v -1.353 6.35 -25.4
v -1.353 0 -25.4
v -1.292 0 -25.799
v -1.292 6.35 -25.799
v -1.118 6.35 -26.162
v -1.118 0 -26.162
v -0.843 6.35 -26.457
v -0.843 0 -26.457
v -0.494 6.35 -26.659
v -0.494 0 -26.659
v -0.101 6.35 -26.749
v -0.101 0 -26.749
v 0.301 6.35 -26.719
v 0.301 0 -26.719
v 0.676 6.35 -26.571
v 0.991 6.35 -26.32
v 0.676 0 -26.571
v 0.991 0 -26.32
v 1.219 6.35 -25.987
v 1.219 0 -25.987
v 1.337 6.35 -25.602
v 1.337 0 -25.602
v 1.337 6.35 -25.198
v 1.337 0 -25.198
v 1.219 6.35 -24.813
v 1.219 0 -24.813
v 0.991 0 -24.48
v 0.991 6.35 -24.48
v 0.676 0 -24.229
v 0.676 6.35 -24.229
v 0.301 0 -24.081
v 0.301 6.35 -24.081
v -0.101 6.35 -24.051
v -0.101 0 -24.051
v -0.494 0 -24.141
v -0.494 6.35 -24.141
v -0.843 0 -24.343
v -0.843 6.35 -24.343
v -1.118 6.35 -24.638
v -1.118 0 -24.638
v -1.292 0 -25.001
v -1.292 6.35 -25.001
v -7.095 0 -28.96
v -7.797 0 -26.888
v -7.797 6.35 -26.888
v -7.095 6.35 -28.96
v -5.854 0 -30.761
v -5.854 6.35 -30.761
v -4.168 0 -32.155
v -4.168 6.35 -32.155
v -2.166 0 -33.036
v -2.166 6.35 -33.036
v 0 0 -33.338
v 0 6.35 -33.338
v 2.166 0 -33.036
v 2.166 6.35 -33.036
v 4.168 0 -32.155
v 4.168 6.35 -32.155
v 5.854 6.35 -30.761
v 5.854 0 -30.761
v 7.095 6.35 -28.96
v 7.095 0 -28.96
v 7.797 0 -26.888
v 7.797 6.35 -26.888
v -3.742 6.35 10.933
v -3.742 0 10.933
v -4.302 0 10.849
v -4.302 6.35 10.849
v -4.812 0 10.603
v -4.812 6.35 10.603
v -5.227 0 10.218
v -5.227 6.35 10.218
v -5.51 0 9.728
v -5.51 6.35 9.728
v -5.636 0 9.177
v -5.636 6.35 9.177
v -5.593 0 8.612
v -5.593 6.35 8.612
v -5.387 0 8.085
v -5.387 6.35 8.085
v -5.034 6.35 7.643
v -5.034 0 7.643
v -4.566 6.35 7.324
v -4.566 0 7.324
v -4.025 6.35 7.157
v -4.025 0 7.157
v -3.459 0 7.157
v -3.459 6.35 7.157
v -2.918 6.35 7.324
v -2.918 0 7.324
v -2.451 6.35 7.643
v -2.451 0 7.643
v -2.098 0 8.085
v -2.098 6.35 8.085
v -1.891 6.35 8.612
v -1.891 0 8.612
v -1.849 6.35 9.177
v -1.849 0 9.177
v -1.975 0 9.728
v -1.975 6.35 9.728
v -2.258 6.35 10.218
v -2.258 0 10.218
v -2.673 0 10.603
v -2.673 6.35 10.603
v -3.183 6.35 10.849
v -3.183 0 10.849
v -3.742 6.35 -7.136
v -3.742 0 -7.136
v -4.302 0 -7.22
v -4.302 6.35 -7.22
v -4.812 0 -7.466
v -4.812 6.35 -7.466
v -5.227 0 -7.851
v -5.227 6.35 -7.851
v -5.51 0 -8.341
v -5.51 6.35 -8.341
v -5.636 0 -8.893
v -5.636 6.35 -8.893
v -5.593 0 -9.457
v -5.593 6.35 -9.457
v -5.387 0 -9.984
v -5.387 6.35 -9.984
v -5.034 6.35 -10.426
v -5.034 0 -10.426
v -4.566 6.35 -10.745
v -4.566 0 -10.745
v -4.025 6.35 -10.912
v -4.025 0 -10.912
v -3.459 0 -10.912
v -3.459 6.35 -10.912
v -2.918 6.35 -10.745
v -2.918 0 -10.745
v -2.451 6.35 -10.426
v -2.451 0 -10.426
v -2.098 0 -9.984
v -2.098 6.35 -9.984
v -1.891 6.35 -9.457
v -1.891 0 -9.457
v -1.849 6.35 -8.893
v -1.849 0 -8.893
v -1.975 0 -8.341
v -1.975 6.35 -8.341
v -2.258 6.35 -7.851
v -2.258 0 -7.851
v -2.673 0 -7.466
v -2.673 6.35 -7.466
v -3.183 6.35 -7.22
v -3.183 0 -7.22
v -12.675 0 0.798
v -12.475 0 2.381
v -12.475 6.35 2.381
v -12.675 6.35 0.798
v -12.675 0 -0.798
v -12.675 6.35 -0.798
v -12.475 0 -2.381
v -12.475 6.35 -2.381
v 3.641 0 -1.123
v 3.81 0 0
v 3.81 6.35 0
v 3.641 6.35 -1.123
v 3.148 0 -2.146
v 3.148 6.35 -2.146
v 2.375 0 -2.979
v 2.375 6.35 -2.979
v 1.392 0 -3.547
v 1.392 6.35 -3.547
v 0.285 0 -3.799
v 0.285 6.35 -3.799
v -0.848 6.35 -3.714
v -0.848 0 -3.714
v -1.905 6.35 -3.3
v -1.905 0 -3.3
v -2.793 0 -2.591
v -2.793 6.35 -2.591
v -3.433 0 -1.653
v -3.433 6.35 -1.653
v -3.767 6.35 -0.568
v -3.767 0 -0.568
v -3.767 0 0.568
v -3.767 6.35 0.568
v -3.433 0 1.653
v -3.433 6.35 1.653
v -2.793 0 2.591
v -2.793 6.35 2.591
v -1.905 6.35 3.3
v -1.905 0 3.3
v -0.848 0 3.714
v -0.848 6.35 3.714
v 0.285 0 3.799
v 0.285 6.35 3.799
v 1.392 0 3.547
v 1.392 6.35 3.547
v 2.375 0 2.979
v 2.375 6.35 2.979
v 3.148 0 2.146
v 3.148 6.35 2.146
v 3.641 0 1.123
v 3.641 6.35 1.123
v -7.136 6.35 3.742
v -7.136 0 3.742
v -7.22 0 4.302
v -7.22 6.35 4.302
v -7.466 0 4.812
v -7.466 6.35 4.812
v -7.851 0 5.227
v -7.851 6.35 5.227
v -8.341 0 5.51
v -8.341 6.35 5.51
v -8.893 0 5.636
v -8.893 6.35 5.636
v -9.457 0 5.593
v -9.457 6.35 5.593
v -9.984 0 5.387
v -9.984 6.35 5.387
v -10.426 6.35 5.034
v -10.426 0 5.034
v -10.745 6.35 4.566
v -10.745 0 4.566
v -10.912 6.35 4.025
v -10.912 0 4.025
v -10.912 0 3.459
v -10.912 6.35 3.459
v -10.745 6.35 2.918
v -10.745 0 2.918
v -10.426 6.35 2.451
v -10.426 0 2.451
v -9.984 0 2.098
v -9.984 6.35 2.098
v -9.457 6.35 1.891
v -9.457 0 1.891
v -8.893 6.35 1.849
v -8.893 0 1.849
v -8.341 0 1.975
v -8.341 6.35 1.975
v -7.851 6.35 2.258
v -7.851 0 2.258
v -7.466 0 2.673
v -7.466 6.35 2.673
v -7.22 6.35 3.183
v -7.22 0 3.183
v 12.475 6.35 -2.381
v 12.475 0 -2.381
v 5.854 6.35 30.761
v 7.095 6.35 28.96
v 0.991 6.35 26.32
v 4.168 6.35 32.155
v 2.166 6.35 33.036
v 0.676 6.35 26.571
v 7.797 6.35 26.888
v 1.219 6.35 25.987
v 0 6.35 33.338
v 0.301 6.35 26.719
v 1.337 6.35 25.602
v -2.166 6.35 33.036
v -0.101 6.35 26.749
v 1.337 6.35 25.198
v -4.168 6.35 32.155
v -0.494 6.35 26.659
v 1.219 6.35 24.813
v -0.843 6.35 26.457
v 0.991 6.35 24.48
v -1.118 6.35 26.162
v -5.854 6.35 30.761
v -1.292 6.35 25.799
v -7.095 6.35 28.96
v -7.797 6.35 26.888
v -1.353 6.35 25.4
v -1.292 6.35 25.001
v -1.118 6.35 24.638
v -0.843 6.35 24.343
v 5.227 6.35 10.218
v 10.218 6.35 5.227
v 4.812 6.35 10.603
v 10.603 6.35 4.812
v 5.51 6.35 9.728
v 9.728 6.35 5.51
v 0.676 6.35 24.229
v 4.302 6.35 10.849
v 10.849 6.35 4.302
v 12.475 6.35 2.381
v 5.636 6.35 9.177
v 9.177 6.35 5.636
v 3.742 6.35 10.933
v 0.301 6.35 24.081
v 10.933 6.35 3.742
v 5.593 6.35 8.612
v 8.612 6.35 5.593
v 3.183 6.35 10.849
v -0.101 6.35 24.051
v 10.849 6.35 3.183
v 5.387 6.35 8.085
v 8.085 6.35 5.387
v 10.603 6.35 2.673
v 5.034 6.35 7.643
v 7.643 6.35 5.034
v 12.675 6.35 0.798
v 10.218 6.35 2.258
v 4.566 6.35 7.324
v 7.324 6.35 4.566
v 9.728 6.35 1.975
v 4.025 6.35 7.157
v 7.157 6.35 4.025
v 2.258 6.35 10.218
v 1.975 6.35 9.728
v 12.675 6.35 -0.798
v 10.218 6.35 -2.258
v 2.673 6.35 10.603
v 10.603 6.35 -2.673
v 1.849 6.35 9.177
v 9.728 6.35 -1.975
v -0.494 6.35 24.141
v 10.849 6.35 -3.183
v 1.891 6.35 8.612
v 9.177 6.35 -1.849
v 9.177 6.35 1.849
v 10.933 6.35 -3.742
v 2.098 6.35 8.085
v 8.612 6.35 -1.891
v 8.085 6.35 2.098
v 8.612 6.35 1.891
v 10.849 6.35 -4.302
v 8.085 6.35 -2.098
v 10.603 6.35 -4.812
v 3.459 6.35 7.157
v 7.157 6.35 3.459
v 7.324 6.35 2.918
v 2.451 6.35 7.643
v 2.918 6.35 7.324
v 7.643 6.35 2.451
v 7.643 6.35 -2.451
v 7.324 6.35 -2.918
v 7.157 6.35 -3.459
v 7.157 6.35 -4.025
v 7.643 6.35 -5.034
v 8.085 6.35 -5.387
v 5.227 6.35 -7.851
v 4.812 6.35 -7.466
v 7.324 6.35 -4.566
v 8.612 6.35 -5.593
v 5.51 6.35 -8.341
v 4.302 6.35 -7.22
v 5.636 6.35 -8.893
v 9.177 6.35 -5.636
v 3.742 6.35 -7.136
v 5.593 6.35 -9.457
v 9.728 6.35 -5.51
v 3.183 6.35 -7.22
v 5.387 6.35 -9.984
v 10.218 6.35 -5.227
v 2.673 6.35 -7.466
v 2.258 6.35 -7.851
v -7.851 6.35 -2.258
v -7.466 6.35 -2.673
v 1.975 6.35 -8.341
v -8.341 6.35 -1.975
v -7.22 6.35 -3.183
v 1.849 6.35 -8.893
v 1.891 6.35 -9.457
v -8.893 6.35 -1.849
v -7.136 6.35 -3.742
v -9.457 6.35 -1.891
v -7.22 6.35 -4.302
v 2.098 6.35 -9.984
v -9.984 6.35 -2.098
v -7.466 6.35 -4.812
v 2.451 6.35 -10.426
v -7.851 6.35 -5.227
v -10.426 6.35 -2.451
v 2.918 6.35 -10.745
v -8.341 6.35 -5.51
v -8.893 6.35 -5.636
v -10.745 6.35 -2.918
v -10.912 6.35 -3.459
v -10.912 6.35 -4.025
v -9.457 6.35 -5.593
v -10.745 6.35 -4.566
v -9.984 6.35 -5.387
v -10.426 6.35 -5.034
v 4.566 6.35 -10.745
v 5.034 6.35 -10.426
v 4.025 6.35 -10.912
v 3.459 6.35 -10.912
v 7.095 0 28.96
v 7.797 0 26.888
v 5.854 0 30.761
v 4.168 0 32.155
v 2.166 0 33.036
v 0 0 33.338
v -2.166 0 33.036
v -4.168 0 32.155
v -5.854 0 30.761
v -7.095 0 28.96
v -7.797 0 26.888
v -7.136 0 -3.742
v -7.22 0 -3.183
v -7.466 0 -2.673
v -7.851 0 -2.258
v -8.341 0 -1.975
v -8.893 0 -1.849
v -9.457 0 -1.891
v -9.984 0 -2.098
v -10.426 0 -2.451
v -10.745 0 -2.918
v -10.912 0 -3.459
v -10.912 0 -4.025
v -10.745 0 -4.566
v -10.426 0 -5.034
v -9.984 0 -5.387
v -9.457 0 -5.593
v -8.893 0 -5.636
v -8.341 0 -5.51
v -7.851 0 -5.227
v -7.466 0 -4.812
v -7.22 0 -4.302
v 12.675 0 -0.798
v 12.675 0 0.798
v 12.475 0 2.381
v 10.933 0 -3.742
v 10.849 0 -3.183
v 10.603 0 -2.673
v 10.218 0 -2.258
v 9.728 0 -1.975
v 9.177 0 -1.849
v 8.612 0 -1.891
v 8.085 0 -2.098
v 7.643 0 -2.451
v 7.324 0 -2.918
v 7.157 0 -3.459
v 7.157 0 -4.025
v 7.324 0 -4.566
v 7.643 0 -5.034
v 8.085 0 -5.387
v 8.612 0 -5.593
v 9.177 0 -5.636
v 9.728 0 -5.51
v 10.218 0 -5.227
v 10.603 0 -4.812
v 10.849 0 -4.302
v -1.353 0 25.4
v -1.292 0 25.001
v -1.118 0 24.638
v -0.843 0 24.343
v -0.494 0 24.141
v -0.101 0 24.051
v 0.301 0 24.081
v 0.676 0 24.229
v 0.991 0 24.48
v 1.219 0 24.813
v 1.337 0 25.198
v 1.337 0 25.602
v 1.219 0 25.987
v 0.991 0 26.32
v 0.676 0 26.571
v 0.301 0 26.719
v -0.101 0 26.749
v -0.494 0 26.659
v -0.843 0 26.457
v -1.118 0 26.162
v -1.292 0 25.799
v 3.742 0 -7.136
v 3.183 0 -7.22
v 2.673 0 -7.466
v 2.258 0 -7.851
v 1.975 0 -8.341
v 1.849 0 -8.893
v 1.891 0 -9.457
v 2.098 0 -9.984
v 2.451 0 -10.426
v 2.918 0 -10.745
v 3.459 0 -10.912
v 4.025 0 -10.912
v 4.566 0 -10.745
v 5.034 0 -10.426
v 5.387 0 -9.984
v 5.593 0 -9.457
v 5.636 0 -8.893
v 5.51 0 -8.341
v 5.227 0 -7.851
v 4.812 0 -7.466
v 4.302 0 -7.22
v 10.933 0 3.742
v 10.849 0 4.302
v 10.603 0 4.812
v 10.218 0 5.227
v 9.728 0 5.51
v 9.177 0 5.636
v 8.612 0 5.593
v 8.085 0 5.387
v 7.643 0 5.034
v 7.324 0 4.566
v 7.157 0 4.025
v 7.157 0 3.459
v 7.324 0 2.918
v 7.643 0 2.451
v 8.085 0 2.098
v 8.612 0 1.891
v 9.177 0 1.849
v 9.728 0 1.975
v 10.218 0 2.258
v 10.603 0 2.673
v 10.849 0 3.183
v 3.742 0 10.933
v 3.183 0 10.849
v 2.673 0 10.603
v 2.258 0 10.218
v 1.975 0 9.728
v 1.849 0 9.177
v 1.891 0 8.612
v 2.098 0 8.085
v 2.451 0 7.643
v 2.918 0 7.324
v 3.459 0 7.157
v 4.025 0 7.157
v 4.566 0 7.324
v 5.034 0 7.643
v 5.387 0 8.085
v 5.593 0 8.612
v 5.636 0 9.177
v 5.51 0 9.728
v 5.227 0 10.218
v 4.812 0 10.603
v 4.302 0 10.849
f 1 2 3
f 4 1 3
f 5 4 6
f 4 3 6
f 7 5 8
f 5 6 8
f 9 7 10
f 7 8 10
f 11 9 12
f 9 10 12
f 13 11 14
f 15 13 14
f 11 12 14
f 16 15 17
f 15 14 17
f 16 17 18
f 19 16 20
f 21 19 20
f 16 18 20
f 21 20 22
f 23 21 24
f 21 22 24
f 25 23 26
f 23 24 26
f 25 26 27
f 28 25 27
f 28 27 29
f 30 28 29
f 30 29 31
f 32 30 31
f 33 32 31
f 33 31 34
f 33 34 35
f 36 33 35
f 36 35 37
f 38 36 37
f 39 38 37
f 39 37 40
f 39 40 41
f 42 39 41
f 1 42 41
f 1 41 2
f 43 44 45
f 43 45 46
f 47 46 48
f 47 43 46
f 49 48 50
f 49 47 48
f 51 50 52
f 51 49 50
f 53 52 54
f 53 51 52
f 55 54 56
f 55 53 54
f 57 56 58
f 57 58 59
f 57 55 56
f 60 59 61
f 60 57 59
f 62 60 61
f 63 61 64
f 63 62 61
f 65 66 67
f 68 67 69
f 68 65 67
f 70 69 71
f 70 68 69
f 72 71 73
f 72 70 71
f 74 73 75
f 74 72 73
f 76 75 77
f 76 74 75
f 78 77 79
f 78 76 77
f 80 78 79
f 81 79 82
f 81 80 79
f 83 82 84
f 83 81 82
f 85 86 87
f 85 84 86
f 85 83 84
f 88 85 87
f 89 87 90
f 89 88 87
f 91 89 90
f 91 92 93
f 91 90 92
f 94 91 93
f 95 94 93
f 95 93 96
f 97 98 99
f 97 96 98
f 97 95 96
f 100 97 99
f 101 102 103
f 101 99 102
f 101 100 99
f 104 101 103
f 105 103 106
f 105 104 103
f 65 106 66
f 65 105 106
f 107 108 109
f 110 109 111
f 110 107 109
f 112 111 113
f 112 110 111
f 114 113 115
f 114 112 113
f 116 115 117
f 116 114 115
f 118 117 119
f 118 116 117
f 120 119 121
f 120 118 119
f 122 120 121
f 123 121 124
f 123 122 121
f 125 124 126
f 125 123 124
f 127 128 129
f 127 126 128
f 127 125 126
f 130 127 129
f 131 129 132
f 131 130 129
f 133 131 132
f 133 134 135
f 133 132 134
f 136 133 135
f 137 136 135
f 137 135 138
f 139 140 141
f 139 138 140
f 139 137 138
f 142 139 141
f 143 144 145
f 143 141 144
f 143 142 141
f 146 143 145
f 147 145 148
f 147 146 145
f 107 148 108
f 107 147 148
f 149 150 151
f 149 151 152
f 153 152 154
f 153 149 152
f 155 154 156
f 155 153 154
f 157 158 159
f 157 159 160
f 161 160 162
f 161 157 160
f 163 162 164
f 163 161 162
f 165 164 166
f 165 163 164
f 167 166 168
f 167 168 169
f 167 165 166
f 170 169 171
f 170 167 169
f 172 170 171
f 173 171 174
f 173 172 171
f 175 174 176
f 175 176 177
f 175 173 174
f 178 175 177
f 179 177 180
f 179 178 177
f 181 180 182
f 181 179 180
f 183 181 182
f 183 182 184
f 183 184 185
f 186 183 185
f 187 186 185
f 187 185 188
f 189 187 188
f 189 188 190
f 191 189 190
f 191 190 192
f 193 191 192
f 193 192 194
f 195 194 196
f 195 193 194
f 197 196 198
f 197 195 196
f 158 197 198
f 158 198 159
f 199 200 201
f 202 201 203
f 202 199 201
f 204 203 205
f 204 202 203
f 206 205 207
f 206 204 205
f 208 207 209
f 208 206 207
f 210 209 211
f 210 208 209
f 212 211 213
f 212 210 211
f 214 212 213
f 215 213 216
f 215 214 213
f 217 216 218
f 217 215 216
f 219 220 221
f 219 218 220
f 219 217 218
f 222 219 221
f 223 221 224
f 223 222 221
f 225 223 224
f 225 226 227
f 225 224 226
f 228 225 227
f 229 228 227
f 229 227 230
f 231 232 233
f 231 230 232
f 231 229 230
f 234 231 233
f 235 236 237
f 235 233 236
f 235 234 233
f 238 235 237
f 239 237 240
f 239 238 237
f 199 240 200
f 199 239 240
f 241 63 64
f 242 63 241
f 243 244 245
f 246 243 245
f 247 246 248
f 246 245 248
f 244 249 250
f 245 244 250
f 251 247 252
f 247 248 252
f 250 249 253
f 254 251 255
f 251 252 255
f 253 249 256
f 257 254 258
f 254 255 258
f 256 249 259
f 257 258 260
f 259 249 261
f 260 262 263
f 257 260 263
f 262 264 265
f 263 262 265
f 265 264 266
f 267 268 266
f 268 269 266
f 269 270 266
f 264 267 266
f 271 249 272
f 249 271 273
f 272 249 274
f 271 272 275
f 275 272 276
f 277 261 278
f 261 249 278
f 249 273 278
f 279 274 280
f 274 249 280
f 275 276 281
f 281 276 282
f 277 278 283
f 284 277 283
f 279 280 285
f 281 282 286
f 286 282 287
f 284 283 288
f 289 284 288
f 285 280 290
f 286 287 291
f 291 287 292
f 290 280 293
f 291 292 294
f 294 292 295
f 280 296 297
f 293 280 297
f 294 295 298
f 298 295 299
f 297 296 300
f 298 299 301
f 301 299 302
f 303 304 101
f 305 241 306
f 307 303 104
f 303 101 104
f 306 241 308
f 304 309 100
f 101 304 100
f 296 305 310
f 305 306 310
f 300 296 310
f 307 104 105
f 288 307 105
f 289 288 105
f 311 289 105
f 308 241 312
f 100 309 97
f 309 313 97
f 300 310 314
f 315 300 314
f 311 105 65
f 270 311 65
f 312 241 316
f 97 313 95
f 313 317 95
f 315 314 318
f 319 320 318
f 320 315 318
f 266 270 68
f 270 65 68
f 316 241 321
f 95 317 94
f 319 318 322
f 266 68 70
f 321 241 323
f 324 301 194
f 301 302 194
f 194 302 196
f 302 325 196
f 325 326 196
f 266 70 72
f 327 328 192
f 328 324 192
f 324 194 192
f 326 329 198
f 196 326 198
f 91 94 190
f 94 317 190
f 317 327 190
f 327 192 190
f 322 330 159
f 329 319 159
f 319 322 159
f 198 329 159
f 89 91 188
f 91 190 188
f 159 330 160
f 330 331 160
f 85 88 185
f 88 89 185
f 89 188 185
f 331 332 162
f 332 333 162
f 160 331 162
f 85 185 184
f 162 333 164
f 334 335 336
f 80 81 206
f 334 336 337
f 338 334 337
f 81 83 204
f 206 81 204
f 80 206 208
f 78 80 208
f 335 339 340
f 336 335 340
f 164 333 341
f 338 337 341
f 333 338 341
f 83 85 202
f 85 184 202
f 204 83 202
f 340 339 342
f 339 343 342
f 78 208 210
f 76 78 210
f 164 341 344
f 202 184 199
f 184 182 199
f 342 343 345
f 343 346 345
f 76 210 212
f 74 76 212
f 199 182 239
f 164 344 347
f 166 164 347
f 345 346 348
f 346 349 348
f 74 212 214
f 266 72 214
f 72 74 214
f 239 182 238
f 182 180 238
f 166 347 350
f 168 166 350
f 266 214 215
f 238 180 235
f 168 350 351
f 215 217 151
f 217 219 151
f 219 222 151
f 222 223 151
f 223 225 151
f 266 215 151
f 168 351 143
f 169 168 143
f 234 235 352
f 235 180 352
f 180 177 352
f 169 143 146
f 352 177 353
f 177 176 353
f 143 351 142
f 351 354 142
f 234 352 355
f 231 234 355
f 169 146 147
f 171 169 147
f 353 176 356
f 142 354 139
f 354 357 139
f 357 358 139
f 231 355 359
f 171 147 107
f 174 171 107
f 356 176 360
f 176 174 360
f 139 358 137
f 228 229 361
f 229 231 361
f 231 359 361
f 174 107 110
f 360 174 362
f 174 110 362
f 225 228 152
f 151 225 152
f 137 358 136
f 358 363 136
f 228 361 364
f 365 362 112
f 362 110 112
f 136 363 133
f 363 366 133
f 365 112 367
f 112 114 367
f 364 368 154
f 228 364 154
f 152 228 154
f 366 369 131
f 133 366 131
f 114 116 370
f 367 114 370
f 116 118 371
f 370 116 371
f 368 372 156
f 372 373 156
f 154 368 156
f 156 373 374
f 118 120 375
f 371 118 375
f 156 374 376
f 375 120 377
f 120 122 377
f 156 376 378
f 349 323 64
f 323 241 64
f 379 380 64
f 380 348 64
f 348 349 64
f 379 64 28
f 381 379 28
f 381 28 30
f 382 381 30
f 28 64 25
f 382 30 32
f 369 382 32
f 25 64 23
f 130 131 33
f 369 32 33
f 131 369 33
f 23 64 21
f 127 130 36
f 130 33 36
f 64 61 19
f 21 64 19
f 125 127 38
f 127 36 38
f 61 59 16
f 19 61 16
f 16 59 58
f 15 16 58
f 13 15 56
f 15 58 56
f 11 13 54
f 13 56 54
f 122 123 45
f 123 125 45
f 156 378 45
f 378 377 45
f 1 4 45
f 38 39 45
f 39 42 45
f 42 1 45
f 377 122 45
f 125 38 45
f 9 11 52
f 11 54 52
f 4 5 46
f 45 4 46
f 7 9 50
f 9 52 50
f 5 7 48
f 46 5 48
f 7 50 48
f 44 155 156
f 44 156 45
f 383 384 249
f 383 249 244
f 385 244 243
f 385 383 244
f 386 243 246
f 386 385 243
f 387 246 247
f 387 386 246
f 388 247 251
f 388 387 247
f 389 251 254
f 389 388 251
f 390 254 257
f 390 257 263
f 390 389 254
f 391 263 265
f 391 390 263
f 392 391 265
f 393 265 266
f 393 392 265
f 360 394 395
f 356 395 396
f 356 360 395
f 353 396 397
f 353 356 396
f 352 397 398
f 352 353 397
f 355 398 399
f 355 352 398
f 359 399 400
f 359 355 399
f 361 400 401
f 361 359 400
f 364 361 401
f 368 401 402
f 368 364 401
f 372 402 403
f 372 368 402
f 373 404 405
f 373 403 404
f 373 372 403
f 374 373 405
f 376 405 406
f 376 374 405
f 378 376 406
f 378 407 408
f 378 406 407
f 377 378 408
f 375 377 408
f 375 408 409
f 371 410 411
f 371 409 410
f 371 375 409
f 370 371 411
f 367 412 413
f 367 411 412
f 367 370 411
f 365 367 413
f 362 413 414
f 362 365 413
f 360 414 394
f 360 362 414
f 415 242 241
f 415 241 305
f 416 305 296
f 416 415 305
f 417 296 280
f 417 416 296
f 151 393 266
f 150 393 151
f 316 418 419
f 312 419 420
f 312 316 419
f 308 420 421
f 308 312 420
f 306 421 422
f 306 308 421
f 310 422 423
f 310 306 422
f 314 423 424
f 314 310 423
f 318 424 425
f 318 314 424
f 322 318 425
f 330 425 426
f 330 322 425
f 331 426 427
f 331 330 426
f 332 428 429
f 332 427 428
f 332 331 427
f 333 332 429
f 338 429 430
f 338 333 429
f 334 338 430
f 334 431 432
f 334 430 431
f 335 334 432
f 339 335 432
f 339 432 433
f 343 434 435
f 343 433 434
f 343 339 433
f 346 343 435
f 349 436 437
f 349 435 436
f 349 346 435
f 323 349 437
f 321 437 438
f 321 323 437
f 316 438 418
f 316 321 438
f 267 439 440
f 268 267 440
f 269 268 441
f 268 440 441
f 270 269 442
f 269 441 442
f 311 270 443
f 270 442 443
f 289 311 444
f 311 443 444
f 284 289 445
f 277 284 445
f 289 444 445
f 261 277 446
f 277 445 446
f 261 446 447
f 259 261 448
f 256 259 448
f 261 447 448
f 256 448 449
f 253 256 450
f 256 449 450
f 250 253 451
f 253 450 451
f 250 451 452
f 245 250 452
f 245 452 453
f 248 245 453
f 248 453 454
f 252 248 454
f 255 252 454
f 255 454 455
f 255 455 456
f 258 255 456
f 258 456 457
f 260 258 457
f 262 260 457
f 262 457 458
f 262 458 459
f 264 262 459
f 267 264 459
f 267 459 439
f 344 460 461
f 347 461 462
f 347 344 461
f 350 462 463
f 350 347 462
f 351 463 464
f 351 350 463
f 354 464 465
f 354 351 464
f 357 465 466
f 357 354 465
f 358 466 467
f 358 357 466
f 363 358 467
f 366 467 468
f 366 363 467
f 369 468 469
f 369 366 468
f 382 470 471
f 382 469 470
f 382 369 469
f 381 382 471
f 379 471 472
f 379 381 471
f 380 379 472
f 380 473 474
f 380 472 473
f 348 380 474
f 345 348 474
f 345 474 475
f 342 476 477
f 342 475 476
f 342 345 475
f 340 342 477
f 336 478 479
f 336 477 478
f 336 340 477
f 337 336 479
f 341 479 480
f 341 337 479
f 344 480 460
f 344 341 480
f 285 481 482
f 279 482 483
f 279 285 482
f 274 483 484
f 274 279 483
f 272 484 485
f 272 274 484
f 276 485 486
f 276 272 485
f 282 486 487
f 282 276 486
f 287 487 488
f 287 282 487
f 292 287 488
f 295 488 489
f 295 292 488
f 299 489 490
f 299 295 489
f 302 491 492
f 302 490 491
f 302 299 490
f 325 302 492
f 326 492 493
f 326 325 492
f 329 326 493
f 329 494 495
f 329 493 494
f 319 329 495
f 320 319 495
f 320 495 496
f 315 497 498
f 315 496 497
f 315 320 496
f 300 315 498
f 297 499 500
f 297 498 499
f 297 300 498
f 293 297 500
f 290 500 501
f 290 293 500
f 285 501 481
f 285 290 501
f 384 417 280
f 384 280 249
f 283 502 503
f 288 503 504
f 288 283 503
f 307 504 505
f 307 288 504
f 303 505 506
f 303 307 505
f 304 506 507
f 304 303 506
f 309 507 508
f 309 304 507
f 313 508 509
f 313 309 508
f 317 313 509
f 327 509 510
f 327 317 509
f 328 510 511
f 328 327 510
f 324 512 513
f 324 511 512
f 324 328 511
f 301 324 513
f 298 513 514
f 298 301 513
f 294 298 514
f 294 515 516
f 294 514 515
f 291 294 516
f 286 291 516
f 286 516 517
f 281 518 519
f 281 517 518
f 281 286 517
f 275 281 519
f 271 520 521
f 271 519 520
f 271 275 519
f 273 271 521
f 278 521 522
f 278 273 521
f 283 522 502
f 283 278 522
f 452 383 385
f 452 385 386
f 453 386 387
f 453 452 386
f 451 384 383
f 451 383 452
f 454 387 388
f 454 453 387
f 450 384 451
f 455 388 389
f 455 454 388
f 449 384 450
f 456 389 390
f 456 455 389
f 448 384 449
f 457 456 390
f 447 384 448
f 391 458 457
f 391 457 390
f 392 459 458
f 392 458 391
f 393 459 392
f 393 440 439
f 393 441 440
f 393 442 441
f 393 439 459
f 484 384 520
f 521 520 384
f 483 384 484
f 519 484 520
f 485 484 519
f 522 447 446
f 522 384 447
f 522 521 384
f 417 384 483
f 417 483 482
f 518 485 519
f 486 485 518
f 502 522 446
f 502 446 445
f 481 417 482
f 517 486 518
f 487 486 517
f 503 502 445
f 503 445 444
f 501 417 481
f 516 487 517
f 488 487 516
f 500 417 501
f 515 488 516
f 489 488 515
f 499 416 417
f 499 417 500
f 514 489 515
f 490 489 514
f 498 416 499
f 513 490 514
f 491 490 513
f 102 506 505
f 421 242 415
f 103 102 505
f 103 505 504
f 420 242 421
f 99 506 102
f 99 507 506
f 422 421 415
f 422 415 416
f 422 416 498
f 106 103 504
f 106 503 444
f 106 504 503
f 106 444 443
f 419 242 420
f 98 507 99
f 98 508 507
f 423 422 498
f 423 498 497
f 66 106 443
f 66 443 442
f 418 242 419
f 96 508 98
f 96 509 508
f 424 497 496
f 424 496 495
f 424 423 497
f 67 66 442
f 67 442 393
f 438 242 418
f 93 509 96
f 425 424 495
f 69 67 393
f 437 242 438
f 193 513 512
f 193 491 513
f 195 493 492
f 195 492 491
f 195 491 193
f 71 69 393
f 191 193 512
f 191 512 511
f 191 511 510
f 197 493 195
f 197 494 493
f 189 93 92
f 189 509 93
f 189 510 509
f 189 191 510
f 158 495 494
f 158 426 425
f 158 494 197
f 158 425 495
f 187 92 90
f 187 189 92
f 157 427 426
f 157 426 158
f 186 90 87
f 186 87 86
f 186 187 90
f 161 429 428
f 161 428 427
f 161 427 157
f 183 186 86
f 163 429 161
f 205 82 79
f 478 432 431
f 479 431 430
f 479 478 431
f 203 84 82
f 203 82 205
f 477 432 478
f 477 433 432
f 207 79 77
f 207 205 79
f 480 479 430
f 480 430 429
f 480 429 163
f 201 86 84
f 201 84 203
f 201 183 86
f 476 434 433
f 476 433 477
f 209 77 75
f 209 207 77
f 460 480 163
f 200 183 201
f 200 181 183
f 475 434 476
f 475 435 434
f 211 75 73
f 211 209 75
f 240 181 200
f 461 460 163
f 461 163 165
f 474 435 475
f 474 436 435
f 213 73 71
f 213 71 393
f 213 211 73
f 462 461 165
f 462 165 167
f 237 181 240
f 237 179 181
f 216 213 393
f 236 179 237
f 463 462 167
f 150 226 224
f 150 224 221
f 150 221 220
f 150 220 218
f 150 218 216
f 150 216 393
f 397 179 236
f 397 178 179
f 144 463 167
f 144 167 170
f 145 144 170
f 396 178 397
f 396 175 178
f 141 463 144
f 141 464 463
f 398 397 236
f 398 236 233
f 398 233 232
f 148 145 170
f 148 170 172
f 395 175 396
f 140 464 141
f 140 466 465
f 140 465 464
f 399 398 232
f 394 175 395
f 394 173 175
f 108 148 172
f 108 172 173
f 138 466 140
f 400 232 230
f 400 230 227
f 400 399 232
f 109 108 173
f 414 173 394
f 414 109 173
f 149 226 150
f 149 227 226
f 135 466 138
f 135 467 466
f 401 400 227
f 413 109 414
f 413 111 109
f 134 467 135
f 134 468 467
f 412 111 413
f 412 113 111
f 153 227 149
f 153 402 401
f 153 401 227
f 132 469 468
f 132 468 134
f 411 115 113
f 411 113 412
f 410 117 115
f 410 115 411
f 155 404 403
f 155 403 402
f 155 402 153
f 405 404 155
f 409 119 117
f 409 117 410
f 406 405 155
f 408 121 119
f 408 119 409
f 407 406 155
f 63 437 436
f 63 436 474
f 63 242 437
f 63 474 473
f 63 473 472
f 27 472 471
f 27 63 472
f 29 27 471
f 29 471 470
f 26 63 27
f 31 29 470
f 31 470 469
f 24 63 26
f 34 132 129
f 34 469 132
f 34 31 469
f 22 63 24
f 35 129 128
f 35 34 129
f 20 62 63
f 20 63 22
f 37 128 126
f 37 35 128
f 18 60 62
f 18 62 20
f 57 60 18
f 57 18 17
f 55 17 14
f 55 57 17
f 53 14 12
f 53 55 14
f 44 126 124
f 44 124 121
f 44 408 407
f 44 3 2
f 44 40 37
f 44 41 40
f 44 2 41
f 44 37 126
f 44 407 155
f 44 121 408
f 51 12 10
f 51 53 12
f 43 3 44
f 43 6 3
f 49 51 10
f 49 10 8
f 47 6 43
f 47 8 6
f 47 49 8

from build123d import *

# Parameters (mm, degrees)
SKETCH1_R                      = 3.81
BOSS_EXTRUDE1_DEPTH            = 6.35
F_6_32_TAPPED_HOLE1_D          = 2.7051
F_6_CLEARANCE_HOLE1_AT_2_COUNT = 2
F_6_CLEARANCE_HOLE1_AT_2_PITCH = 7.48452257
F_6_CLEARANCE_HOLE1_AT_3_COUNT = 2
F_6_CLEARANCE_HOLE1_AT_3_PITCH = 19.558
F_6_CLEARANCE_HOLE1_AT_4_COUNT = 2
F_6_CLEARANCE_HOLE1_AT_4_PITCH = 18.069235897
CIRPATTERN1_COUNT              = 2
CIRPATTERN1_ANGLE              = 90


with BuildPart() as part:
    # Sketch1 → Boss-Extrude1 (new body)
    with BuildSketch(Plane(origin=(0, 0, 0), x_dir=(1, 0, 0), z_dir=(0, 1, 0))):
        with BuildLine():
            Line((-12.474760456, 2.38125), (-7.796725285, 26.88828125))
            ThreePointArc((-7.796725285, 26.88828125), (0, 33.3375), (7.796725285, 26.88828125))
            Line((7.796725285, 26.88828125), (12.474760456, 2.38125))
            ThreePointArc((12.474760456, 2.38125), (12.7, 0), (12.474760456, -2.38125))
            Line((12.474760456, -2.38125), (7.796725285, -26.88828125))
            ThreePointArc((7.796725285, -26.88828125), (0, -33.3375), (-7.796725285, -26.88828125))
            Line((-7.796725285, -26.88828125), (-12.474760456, -2.38125))
            ThreePointArc((-12.474760456, -2.38125), (-12.7, 0), (-12.474760456, 2.38125))
        make_face()
        Circle(SKETCH1_R, mode=Mode.SUBTRACT)
    extrude(amount=BOSS_EXTRUDE1_DEPTH)

    # #6-32 Tapped Hole1 (through all)
    with Locations(Plane(origin=(0, 6.35, 0), x_dir=(1, 0, 0), z_dir=(0, 1, 0))):
        with Locations((0, -25.4), (0, 25.4)):
            Hole(F_6_32_TAPPED_HOLE1_D / 2)

    # Sketch6 → #6 Clearance Hole1 (revolve, cut)
    with BuildSketch(Plane(origin=(-3.742261285, 6.35, -9.034617948), x_dir=(0, 0, 1), z_dir=(1, 0, 0))):
        Polygon((0, 0), (0, 10.538824014), (1.89865, 9.398), (1.89865, 0), align=None)
    f_6_clearance_hole1 = revolve(axis=Axis((-3.742261285, 12.7, -9.034617948), (0, -1, 0)), mode=Mode.SUBTRACT)

    # #6 Clearance Hole1 at 2: #6 Clearance Hole1 ×2
    with Locations(*[(i * F_6_CLEARANCE_HOLE1_AT_2_PITCH, 0, 0) for i in range(1, F_6_CLEARANCE_HOLE1_AT_2_COUNT)]):
        add(f_6_clearance_hole1, mode=Mode.SUBTRACT)

    # #6 Clearance Hole1 at 3: #6 Clearance Hole1 ×2
    with Locations(*[Vector(0.382683432, 0, 0.923879533) * (i * F_6_CLEARANCE_HOLE1_AT_3_PITCH) for i in range(1, F_6_CLEARANCE_HOLE1_AT_3_COUNT)]):
        add(f_6_clearance_hole1, mode=Mode.SUBTRACT)

    # #6 Clearance Hole1 at 4: #6 Clearance Hole1 ×2
    with Locations(*[(0, 0, i * F_6_CLEARANCE_HOLE1_AT_4_PITCH) for i in range(1, F_6_CLEARANCE_HOLE1_AT_4_COUNT)]):
        add(f_6_clearance_hole1, mode=Mode.SUBTRACT)

    # CirPattern1: #6 Clearance Hole1 ×2 about axis
    cirpattern1_axis = Axis((0, 0, 0), (0, 1, 0))
    for i in range(1, CIRPATTERN1_COUNT):
        add(f_6_clearance_hole1.rotate(cirpattern1_axis, i * CIRPATTERN1_ANGLE / (CIRPATTERN1_COUNT - 1)), mode=Mode.SUBTRACT)

    # CirPattern1 copy 1 sketch → CirPattern1 copy 1 (revolve, cut)
    with BuildSketch(Plane(origin=(-9.034617948, 6.35, -3.742261285), x_dir=(1, 0, 0), z_dir=(0, 0, -1))):
        Polygon((0, 0), (0, 10.538824014), (1.89865, 9.398), (1.89865, 0), align=None)
    revolve(axis=Axis((-9.034617948, 12.7, -3.742261285), (0, -1, 0)), mode=Mode.SUBTRACT)

    # CirPattern1 copy 2 sketch → CirPattern1 copy 2 (revolve, cut)
    with BuildSketch(Plane(origin=(9.034617948, 6.35, -3.742261285), x_dir=(1, 0, 0), z_dir=(0, 0, -1))):
        Polygon((0, 0), (0, 10.538824014), (1.89865, 9.398), (1.89865, 0), align=None)
    revolve(axis=Axis((9.034617948, 12.7, -3.742261285), (0, -1, 0)), mode=Mode.SUBTRACT)

    # CirPattern1 copy 3 sketch → CirPattern1 copy 3 (revolve, cut)
    with BuildSketch(Plane(origin=(9.034617948, 6.35, 3.742261285), x_dir=(1, 0, 0), z_dir=(0, 0, -1))):
        Polygon((0, 0), (0, 10.538824014), (1.89865, 9.398), (1.89865, 0), align=None)
    revolve(axis=Axis((9.034617948, 12.7, 3.742261285), (0, -1, 0)), mode=Mode.SUBTRACT)


solid = part.part
